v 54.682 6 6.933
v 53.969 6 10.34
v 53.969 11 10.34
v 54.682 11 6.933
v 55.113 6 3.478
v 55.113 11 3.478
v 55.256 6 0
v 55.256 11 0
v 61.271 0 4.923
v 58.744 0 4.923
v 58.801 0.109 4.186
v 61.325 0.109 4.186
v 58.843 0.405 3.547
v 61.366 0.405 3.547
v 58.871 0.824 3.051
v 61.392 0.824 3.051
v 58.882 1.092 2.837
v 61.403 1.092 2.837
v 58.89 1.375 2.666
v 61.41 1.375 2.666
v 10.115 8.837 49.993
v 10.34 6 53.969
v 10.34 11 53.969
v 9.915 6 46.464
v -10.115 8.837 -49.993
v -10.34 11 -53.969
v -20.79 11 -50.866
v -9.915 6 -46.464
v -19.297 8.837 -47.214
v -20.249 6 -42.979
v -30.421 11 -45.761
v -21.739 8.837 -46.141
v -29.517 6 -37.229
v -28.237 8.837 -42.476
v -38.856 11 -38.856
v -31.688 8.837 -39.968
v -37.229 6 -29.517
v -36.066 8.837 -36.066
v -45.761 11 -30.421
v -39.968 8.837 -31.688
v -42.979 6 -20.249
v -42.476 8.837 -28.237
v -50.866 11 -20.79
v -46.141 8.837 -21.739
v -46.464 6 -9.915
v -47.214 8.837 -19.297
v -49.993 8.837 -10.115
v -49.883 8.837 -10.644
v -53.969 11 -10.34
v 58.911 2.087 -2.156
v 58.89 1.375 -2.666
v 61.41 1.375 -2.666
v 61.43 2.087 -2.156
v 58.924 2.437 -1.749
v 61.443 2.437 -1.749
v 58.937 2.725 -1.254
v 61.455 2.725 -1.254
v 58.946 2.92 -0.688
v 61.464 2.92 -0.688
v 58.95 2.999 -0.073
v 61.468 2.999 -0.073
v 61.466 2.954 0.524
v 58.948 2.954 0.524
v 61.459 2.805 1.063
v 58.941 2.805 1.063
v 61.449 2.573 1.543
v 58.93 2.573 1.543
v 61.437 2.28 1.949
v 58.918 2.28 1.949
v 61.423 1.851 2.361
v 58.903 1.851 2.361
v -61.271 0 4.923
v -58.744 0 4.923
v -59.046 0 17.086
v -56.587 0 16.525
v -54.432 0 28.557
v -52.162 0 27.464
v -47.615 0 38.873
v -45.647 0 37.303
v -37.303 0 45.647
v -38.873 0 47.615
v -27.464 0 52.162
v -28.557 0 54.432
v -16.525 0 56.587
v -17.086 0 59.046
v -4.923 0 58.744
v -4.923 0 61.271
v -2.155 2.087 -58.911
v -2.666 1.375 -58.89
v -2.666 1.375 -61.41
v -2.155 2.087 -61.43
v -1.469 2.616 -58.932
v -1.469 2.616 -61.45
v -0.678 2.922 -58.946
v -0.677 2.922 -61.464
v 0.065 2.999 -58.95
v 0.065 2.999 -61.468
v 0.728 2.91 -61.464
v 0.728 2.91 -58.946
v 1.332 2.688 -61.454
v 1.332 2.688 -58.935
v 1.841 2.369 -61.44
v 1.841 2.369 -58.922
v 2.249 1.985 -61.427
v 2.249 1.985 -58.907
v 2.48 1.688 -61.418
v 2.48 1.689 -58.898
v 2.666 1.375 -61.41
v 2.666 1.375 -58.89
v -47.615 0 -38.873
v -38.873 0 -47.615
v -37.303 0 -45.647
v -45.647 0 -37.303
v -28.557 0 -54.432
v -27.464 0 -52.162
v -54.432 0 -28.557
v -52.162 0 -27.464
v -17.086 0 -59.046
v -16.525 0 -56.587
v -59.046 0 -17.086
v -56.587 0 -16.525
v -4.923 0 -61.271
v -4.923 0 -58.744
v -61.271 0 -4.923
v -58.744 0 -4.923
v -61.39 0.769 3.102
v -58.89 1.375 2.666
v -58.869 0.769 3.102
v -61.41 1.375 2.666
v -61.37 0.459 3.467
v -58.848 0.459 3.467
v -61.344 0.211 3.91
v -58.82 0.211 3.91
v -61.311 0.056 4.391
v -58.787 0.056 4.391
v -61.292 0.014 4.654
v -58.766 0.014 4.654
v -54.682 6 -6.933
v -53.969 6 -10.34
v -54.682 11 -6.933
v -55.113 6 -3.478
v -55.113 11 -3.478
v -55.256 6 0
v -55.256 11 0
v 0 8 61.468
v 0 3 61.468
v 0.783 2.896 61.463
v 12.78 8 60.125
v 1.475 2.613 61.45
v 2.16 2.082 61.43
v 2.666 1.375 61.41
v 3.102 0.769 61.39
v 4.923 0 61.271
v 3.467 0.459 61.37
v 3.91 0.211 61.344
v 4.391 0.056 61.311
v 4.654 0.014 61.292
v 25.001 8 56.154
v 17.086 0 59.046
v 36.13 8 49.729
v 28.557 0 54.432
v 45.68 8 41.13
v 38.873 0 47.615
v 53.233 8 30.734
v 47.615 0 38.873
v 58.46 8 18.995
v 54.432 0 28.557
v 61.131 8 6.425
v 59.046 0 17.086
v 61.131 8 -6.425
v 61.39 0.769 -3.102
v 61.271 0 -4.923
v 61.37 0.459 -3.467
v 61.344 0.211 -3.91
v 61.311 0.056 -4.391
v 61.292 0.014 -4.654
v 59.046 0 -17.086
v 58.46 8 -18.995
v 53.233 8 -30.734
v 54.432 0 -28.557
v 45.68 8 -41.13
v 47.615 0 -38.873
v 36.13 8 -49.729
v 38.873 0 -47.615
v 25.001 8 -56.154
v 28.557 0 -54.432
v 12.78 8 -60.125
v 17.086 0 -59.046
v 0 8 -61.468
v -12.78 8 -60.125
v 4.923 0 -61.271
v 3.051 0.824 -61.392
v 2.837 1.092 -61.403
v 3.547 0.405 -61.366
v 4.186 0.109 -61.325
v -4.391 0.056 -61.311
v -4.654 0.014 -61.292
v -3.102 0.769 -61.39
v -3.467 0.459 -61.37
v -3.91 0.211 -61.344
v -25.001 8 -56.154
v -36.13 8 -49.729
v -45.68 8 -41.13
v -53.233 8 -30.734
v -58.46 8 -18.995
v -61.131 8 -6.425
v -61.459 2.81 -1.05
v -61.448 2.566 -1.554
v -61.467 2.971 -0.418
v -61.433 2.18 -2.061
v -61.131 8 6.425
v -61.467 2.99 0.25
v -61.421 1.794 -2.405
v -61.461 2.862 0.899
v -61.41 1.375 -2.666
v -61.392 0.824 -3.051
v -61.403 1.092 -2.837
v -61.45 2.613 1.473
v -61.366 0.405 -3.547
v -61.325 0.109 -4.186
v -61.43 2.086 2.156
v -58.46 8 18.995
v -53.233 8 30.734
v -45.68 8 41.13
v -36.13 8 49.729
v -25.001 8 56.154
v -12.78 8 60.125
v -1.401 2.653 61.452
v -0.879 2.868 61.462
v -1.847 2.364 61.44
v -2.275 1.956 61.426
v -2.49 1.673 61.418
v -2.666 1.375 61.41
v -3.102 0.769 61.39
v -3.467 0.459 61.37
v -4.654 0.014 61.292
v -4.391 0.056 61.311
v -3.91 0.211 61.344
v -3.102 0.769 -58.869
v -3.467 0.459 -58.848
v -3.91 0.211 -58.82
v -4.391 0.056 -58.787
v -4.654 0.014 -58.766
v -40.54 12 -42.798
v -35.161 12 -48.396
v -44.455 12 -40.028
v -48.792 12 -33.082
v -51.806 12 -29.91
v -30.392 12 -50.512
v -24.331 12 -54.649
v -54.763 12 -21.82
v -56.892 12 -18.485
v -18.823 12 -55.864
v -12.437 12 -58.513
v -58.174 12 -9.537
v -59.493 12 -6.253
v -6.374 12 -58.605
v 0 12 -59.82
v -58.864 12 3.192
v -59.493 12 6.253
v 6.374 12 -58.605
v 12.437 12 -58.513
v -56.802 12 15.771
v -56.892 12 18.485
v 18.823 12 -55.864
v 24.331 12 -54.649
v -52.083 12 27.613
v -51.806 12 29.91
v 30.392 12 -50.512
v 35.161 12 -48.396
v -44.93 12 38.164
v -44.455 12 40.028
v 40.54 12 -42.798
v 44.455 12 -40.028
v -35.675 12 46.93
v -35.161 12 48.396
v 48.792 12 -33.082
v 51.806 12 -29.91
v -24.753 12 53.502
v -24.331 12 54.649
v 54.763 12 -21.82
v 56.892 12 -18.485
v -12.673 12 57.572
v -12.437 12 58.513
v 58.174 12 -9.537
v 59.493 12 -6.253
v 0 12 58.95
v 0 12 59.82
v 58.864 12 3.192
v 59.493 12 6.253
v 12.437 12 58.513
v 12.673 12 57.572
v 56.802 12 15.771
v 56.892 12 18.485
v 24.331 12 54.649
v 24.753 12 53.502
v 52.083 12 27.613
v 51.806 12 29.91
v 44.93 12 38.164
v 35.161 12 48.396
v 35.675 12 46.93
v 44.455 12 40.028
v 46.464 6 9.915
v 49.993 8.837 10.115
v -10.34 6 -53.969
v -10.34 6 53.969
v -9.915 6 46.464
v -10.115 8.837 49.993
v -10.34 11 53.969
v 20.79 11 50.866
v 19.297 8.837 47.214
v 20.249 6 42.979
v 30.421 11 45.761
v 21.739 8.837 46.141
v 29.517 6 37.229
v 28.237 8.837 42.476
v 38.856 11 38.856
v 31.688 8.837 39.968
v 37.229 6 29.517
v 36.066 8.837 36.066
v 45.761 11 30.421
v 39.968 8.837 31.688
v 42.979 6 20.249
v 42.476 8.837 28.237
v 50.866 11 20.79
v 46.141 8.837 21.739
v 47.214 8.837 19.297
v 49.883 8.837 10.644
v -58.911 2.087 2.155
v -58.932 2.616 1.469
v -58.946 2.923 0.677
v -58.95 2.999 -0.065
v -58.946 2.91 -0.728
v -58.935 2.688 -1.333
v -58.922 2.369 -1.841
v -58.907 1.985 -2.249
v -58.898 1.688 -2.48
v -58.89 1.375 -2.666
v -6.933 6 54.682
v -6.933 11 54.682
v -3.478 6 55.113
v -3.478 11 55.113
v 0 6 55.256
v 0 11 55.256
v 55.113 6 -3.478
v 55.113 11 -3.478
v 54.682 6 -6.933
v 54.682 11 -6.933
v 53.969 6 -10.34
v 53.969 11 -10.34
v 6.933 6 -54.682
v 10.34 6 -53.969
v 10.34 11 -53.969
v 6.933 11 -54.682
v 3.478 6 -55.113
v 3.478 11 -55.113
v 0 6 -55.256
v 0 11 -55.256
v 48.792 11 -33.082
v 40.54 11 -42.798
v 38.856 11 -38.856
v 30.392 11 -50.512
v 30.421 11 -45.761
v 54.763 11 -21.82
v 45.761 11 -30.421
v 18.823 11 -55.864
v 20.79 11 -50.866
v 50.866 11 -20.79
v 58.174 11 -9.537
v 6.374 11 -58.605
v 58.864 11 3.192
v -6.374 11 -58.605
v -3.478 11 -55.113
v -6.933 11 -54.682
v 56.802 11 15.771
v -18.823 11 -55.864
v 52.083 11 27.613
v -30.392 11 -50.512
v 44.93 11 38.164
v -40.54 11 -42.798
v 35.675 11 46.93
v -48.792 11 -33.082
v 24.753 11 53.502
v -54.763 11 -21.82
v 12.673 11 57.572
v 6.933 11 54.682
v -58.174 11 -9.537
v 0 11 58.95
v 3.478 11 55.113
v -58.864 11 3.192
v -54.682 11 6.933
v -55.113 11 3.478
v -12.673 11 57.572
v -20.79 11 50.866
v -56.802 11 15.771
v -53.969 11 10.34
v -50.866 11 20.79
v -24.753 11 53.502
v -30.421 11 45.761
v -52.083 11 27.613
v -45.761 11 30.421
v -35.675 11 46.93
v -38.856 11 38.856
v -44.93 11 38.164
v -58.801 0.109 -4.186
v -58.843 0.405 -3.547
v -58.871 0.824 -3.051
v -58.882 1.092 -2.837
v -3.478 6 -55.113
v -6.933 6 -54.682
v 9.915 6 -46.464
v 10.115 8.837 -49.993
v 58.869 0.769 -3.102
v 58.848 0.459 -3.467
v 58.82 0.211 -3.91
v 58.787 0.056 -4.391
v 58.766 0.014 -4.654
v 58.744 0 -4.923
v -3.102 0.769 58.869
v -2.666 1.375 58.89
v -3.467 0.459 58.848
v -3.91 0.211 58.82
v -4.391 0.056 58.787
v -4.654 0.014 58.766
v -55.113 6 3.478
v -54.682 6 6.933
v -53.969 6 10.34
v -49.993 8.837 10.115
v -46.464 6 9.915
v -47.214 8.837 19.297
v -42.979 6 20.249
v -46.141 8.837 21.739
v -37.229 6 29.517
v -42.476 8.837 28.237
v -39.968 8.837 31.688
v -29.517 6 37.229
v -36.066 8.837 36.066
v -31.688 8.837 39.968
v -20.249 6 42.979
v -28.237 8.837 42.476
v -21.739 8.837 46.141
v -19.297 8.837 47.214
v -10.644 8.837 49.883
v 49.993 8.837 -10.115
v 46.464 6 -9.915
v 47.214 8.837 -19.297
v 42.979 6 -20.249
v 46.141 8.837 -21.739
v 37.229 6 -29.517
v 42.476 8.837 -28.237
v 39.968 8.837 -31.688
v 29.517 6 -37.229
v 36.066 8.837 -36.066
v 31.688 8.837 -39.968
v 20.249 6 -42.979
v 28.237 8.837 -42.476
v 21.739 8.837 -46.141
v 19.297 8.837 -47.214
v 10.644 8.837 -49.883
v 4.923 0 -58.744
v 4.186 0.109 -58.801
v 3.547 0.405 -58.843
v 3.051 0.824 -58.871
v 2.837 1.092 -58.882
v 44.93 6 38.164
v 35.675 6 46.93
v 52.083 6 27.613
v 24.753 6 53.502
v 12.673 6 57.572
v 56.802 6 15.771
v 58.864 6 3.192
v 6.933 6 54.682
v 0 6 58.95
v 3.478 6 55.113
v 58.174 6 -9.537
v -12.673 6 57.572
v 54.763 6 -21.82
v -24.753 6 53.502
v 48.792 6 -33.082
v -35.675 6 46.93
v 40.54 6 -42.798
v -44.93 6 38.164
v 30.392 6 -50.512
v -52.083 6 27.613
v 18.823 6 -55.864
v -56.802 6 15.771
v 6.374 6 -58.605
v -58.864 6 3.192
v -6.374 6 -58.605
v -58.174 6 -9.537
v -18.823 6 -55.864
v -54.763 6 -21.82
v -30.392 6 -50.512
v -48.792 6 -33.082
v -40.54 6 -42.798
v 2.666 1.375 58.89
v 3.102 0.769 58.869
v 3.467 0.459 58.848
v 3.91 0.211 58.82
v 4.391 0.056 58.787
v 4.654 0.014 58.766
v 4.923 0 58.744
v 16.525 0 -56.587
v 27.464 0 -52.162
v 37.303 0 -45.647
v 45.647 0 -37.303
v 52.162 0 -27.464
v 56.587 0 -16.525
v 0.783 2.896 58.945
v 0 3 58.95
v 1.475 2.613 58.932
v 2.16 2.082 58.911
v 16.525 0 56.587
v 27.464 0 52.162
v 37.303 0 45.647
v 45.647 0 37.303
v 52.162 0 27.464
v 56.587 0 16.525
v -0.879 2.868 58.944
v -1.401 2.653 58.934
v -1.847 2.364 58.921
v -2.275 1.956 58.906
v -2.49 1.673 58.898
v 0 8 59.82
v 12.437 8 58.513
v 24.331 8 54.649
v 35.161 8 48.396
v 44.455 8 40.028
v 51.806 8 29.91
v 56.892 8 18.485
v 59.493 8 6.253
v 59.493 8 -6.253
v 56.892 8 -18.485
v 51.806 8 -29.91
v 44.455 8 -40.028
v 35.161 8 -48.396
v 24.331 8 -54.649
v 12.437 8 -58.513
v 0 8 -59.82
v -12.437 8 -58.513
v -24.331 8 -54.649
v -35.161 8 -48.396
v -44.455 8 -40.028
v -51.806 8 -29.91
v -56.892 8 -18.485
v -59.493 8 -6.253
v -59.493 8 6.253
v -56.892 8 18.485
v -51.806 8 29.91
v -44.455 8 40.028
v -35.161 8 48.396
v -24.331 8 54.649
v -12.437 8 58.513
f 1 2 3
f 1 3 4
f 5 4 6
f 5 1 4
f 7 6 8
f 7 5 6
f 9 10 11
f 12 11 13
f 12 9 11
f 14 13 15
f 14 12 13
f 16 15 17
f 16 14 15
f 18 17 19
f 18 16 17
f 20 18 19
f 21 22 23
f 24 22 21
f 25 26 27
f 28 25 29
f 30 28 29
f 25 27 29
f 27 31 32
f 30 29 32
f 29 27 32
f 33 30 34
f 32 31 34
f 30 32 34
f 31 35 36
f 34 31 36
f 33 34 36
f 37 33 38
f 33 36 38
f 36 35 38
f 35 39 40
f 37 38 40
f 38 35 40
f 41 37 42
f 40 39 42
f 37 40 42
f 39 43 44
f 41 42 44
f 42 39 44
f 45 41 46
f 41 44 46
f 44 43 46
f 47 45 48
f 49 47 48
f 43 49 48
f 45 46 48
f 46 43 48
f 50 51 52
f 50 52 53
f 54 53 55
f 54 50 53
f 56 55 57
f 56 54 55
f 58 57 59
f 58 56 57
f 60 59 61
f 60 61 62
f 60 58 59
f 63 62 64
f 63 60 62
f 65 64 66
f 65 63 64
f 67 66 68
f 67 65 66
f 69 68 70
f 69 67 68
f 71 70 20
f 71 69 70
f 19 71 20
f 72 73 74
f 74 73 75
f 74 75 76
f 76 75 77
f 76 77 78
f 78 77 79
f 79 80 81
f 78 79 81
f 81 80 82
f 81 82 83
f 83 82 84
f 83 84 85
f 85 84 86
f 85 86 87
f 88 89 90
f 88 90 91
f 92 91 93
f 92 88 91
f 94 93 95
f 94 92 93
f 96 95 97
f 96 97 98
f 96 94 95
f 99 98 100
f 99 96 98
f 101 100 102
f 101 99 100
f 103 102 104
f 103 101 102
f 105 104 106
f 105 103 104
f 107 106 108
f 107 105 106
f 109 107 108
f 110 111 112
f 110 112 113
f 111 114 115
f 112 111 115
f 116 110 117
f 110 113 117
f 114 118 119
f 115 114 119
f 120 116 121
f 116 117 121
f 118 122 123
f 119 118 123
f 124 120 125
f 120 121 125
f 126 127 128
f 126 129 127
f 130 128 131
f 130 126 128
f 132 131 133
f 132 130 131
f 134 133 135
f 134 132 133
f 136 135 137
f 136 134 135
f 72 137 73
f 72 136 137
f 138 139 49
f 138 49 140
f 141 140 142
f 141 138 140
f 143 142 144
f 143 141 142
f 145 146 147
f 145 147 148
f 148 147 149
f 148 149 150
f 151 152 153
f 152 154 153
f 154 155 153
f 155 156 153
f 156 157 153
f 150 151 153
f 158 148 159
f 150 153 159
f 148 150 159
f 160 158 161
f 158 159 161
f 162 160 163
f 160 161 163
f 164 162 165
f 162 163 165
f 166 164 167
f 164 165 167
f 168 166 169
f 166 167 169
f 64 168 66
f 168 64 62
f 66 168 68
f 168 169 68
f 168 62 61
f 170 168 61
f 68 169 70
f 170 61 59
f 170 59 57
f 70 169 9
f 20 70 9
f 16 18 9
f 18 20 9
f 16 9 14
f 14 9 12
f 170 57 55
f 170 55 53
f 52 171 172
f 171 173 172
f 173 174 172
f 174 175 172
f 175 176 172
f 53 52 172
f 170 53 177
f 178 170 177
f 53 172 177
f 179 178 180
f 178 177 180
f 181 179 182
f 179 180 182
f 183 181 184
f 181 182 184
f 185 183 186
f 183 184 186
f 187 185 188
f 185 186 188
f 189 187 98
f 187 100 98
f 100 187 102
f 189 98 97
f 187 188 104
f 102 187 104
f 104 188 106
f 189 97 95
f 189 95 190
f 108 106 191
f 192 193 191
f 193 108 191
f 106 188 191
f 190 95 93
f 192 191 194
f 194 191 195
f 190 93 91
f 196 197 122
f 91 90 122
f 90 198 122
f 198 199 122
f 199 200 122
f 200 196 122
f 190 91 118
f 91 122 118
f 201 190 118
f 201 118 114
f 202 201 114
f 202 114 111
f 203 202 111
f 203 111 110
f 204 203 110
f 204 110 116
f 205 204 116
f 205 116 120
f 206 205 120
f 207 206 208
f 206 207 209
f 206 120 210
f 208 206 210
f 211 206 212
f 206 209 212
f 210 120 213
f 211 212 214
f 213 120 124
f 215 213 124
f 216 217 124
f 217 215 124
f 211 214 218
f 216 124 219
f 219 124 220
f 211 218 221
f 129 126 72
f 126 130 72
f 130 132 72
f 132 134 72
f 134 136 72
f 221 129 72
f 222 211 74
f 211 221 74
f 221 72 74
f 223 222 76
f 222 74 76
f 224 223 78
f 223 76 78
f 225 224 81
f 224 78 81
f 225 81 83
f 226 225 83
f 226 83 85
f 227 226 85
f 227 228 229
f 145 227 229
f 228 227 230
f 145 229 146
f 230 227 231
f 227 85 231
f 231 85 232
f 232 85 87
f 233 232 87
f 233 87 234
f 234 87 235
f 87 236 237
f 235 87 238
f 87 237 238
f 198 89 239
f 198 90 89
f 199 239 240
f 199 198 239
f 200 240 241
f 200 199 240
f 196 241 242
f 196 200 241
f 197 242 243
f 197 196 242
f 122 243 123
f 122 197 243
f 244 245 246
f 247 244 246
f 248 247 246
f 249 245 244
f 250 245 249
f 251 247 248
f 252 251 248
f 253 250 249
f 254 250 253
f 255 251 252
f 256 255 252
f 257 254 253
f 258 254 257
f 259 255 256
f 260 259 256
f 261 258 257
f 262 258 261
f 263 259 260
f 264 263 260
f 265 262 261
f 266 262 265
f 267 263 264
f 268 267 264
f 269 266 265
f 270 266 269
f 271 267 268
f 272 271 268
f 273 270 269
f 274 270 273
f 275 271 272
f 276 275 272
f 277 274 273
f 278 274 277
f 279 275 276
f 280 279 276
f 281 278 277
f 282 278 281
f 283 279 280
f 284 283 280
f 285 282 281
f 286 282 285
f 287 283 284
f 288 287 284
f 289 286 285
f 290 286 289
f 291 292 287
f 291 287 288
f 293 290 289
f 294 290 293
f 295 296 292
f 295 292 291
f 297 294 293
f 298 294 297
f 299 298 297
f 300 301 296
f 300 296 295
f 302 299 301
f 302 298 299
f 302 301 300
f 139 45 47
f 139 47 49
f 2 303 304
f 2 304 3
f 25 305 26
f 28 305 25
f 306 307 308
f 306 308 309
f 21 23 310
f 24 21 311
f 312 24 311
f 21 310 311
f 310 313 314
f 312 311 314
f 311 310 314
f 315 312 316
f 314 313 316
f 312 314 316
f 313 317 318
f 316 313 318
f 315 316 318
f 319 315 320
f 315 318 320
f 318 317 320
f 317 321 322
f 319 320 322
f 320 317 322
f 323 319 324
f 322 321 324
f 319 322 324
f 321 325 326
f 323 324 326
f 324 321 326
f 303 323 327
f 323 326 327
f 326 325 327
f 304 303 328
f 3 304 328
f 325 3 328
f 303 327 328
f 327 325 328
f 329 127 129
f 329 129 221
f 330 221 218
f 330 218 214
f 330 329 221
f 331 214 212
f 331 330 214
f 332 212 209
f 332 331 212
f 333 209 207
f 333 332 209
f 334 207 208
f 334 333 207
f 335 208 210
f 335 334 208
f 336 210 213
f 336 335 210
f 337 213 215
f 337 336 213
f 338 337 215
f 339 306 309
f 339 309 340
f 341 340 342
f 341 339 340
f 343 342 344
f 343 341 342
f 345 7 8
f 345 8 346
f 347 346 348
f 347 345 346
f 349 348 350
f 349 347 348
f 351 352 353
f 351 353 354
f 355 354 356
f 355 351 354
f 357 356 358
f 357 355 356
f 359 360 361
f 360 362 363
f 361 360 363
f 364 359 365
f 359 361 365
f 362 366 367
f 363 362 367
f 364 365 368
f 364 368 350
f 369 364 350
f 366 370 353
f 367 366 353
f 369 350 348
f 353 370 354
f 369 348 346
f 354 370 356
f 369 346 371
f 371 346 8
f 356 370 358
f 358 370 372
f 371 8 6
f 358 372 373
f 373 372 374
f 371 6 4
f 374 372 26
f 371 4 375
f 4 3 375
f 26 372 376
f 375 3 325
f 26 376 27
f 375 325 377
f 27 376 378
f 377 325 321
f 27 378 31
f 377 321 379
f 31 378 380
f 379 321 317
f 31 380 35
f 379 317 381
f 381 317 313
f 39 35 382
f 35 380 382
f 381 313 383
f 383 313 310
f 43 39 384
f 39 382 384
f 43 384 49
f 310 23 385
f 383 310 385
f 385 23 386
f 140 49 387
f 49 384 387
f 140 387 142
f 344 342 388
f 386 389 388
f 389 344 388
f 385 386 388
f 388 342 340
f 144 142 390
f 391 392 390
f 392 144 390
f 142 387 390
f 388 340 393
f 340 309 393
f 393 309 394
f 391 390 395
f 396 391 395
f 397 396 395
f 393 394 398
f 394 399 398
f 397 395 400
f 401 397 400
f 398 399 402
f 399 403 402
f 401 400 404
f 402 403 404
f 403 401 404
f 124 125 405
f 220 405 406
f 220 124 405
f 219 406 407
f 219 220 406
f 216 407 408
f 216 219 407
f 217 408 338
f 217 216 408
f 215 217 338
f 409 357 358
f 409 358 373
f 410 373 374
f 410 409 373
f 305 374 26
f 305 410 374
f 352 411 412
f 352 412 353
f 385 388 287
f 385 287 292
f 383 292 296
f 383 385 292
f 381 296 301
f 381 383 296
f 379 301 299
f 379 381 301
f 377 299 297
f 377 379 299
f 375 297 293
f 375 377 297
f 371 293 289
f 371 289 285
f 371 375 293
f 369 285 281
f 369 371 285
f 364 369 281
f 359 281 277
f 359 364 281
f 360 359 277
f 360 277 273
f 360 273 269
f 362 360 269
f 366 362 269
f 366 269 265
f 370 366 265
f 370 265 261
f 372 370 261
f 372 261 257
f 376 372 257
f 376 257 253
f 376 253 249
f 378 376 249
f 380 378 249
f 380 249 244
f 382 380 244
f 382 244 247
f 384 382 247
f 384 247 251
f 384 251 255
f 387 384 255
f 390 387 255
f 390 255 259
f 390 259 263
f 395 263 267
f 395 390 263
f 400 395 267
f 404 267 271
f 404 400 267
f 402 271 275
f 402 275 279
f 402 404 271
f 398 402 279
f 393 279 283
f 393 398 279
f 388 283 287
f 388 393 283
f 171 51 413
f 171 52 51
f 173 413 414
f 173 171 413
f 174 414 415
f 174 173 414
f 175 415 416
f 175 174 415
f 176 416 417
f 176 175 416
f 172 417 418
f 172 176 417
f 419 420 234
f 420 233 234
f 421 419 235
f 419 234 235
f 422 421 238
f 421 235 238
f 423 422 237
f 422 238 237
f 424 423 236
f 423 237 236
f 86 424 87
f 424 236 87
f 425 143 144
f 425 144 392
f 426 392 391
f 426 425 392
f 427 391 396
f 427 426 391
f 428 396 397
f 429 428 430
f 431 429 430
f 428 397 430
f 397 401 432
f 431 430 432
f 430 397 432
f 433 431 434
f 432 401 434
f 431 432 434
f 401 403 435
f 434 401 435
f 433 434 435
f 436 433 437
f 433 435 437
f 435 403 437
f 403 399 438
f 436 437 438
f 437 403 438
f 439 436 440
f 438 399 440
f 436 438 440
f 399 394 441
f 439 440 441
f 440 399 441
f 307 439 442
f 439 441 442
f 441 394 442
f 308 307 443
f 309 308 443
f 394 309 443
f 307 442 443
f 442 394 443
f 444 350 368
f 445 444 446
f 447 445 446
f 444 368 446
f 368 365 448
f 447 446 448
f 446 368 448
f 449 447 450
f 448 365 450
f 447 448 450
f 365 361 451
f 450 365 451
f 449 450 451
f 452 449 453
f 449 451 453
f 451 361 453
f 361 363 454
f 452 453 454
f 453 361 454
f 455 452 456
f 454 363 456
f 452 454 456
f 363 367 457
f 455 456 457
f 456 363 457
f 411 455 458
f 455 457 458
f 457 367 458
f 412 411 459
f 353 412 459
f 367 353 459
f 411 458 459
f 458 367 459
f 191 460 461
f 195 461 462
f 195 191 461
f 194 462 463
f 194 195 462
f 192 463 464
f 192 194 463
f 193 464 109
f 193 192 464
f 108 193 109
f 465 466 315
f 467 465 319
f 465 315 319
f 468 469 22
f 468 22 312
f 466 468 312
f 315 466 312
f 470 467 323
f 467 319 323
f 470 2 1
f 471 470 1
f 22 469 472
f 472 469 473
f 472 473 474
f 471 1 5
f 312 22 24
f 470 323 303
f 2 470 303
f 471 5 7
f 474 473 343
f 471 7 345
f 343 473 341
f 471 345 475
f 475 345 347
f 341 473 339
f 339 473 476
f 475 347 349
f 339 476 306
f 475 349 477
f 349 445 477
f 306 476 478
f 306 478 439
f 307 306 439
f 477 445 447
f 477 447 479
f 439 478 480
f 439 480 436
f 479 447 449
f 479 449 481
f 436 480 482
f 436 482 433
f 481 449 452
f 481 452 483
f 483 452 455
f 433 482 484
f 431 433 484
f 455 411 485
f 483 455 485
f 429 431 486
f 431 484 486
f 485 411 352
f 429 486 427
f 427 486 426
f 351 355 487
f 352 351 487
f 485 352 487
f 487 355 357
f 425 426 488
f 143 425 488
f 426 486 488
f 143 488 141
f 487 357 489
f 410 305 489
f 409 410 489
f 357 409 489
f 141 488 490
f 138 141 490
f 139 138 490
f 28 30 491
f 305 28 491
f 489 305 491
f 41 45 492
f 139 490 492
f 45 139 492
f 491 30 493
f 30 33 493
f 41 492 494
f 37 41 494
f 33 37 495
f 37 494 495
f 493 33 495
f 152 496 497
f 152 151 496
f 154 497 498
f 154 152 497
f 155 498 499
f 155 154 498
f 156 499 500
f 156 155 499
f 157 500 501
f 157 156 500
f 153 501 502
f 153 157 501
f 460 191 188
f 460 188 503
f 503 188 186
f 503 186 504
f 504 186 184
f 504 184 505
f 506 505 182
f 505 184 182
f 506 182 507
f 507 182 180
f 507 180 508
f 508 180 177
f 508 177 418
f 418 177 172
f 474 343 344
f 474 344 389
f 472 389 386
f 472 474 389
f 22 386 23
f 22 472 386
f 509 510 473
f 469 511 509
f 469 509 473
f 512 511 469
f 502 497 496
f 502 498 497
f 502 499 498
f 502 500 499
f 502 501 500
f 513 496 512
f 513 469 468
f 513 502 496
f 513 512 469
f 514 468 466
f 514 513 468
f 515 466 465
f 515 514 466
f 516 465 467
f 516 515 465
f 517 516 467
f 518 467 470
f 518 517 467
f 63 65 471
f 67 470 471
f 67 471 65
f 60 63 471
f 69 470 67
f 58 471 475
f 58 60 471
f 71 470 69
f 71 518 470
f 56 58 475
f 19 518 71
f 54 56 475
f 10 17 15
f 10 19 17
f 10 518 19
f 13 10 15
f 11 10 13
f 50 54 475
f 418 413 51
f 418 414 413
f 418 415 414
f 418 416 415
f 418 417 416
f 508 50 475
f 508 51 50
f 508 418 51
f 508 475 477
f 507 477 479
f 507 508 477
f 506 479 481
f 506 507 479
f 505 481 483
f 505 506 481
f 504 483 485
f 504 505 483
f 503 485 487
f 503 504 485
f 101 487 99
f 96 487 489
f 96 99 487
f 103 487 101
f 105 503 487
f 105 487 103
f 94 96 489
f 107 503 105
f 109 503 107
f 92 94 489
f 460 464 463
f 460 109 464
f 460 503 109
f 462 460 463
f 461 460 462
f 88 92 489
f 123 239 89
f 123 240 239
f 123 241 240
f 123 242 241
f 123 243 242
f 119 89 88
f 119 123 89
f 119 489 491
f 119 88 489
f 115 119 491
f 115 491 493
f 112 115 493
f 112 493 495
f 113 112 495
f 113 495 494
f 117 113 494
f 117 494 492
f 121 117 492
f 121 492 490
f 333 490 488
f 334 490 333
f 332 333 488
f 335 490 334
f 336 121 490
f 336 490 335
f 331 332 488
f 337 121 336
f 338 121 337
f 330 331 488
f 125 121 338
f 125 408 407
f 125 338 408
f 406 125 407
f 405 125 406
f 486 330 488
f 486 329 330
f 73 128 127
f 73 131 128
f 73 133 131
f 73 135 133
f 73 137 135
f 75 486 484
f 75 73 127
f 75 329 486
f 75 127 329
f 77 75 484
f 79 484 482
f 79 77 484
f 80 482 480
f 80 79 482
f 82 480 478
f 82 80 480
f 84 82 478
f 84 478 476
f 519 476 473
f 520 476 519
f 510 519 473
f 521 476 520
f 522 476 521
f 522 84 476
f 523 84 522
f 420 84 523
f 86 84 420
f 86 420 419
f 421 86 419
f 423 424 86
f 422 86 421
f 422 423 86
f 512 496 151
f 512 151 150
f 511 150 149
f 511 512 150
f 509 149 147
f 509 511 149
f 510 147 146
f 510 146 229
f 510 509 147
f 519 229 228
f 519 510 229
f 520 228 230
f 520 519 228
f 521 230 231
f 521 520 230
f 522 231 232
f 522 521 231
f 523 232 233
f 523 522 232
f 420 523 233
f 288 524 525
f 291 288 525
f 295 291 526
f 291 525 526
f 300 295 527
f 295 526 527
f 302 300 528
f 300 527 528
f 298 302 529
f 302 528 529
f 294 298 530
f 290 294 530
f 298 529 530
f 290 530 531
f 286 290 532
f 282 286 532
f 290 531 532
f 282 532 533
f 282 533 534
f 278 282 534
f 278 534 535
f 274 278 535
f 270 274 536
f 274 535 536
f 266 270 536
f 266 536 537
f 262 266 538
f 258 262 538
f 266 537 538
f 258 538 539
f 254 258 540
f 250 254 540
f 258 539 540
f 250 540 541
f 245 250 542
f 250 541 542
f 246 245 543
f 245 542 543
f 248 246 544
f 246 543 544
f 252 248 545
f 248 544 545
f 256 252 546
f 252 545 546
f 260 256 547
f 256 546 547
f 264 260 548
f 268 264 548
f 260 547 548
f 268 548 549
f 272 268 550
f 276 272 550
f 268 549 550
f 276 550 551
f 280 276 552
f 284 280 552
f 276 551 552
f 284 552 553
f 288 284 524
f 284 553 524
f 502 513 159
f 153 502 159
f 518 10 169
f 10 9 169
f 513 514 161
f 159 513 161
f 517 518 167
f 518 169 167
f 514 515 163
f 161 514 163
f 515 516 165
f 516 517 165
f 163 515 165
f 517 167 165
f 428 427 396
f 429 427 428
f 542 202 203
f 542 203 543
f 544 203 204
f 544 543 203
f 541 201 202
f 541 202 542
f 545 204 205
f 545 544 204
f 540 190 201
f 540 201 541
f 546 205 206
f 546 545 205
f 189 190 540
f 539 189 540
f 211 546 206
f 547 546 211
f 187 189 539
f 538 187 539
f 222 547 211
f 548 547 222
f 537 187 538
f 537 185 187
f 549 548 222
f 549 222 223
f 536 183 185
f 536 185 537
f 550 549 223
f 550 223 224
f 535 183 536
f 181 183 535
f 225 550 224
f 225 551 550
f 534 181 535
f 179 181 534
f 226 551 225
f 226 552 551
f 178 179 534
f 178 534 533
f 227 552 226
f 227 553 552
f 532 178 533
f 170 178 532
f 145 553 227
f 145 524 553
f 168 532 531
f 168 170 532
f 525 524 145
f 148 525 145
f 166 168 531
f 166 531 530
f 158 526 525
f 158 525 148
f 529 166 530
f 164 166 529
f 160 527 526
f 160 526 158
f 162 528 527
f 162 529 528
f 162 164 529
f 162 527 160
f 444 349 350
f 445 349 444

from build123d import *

# Parameters (mm, degrees)
SKETCH3_R                = 61.468
SKETCH3_R_2              = 58.95025584
BOSS_EXTRUDE1_DEPTH      = 8
SKETCH7_R                = 59.82025584
SKETCH7_R_2              = 58.95025584
BOSS_EXTRUDE2_DEPTH      = 4
CUT_EXTRUDE1_DEPTH       = 88.753233832
FILLET1_R                = 2.54
CIRPATTERN1_COUNT        = 4
FILLET1_OF_CIRPATTERN1_R = 2.54
CUT_EXTRUDE4_DEPTH       = 88.753233984
CIRPATTERN3_COUNT        = 4


with BuildPart() as part:
    # Sketch3 → Boss-Extrude1 (new body)
    with BuildSketch(Plane(origin=(0, 0, 0), x_dir=(1, 0, 0), z_dir=(0, 1, 0))):
        with Locations(Location((0, 0, 0), (0, 0, 270))):
            Circle(SKETCH3_R)
        with Locations(Location((0, 0, 0), (0, 0, 270))):
            Circle(SKETCH3_R_2, mode=Mode.SUBTRACT)
    extrude(amount=BOSS_EXTRUDE1_DEPTH)

    # Sketch7 → Boss-Extrude2 (add)
    with BuildSketch(Plane(origin=(0, 8, 0), x_dir=(1, 0, 0), z_dir=(0, 1, 0))):
        with Locations(Location((0, 0, 0), (0, 0, 270))):
            Circle(SKETCH7_R)
        with Locations(Location((0, 0, 0), (0, 0, 270))):
            Circle(SKETCH7_R_2, mode=Mode.SUBTRACT)
    extrude(amount=BOSS_EXTRUDE2_DEPTH)

    # Sketch9 → Cut-Extrude1 (cut, through all)
    with BuildSketch(Plane.XY):
        with BuildLine():
            Line((0, 0), (3, 0))
            ThreePointArc((3, 0), (0, 3), (-3, 0))
            Line((-3, 0), (0, 0))
        make_face()
    cut_extrude1 = extrude(amount=CUT_EXTRUDE1_DEPTH, mode=Mode.SUBTRACT)

    # Fillet1
    fillet1_edges = [part.edges().sort_by_distance(p)[0] for p in [
        (3, 0, 60.134309167),
        (-3, 0, 60.134309167),
    ]]
    fillet(fillet1_edges, radius=FILLET1_R)

    # CirPattern1: Cut-Extrude1 ×4 about axis
    cirpattern1_axis = Axis((0, 8, 0), (0, 1, 0))
    for i in range(1, CIRPATTERN1_COUNT):
        add(cut_extrude1.rotate(cirpattern1_axis, i * 360 / CIRPATTERN1_COUNT), mode=Mode.SUBTRACT)

    # Fillet1 of CirPattern1
    fillet1_of_cirpattern1_edges = [part.edges().sort_by_distance(p)[0] for p in [
        (60.134309167, 0, -3),
        (60.134309167, 0, 3),
        (-3, 0, -60.134309167),
        (3, 0, -60.134309167),
        (-60.134309167, 0, 3),
        (-60.134309167, 0, -3),
    ]]
    fillet(fillet1_of_cirpattern1_edges, radius=FILLET1_OF_CIRPATTERN1_R)

    # Sketch10 → Revolve2 (revolve)
    with BuildSketch(Plane.XY, mode=Mode.PRIVATE) as revolve2_sk:
        with BuildLine():
            Line((-58.95025584, 6), (-47.51025584, 6))
            ThreePointArc((-47.51025584, 6), (-51.004325155, 8.83618486), (-54.95025584, 11))
            Line((-54.95025584, 11), (-58.95025584, 11))
            Line((-58.95025584, 11), (-58.95025584, 6))
        make_face()
    revolve(revolve2_sk.sketch.rotate(Axis((0, 0, 0), (0, 1, 0)), 270), axis=Axis((0, 0, 0), (0, 1, 0)))

    # Sketch13 → Cut-Extrude4 (cut, through all)
    with BuildSketch(Plane(origin=(0, 0, 0), x_dir=(1, 0, 0), z_dir=(0, 1, 0))):
        with BuildLine():
            ThreePointArc((-9.707144427, 42.796913747), (-4.982712156, 44.461503222), (0, 44.97501853))
            Line((0, 44.97501853), (0, 55.25649697))
            ThreePointArc((0, 55.25649697), (-5.209883661, 54.933301733), (-10.339877075, 53.968672014))
            Line((-10.339877075, 53.968672014), (-9.707144427, 42.796913747))
        make_face()
        with BuildLine():
            Line((0, 55.25649697), (0, 44.97501853))
            ThreePointArc((0, 44.97501853), (4.993665079, 44.301497693), (9.688751248, 42.472157075))
            Line((9.688751248, 42.472157075), (10.339877075, 53.968672014))
            ThreePointArc((10.339877075, 53.968672014), (5.209883661, 54.933301733), (0, 55.25649697))
        make_face()
    cut_extrude4 = extrude(amount=CUT_EXTRUDE4_DEPTH, mode=Mode.SUBTRACT)

    # CirPattern3: Cut-Extrude4 ×4 about axis
    cirpattern3_axis = Axis((0, 0, 0), (0, 1, 0))
    for i in range(1, CIRPATTERN3_COUNT):
        add(cut_extrude4.rotate(cirpattern3_axis, i * 360 / CIRPATTERN3_COUNT), mode=Mode.SUBTRACT)


solid = part.part
